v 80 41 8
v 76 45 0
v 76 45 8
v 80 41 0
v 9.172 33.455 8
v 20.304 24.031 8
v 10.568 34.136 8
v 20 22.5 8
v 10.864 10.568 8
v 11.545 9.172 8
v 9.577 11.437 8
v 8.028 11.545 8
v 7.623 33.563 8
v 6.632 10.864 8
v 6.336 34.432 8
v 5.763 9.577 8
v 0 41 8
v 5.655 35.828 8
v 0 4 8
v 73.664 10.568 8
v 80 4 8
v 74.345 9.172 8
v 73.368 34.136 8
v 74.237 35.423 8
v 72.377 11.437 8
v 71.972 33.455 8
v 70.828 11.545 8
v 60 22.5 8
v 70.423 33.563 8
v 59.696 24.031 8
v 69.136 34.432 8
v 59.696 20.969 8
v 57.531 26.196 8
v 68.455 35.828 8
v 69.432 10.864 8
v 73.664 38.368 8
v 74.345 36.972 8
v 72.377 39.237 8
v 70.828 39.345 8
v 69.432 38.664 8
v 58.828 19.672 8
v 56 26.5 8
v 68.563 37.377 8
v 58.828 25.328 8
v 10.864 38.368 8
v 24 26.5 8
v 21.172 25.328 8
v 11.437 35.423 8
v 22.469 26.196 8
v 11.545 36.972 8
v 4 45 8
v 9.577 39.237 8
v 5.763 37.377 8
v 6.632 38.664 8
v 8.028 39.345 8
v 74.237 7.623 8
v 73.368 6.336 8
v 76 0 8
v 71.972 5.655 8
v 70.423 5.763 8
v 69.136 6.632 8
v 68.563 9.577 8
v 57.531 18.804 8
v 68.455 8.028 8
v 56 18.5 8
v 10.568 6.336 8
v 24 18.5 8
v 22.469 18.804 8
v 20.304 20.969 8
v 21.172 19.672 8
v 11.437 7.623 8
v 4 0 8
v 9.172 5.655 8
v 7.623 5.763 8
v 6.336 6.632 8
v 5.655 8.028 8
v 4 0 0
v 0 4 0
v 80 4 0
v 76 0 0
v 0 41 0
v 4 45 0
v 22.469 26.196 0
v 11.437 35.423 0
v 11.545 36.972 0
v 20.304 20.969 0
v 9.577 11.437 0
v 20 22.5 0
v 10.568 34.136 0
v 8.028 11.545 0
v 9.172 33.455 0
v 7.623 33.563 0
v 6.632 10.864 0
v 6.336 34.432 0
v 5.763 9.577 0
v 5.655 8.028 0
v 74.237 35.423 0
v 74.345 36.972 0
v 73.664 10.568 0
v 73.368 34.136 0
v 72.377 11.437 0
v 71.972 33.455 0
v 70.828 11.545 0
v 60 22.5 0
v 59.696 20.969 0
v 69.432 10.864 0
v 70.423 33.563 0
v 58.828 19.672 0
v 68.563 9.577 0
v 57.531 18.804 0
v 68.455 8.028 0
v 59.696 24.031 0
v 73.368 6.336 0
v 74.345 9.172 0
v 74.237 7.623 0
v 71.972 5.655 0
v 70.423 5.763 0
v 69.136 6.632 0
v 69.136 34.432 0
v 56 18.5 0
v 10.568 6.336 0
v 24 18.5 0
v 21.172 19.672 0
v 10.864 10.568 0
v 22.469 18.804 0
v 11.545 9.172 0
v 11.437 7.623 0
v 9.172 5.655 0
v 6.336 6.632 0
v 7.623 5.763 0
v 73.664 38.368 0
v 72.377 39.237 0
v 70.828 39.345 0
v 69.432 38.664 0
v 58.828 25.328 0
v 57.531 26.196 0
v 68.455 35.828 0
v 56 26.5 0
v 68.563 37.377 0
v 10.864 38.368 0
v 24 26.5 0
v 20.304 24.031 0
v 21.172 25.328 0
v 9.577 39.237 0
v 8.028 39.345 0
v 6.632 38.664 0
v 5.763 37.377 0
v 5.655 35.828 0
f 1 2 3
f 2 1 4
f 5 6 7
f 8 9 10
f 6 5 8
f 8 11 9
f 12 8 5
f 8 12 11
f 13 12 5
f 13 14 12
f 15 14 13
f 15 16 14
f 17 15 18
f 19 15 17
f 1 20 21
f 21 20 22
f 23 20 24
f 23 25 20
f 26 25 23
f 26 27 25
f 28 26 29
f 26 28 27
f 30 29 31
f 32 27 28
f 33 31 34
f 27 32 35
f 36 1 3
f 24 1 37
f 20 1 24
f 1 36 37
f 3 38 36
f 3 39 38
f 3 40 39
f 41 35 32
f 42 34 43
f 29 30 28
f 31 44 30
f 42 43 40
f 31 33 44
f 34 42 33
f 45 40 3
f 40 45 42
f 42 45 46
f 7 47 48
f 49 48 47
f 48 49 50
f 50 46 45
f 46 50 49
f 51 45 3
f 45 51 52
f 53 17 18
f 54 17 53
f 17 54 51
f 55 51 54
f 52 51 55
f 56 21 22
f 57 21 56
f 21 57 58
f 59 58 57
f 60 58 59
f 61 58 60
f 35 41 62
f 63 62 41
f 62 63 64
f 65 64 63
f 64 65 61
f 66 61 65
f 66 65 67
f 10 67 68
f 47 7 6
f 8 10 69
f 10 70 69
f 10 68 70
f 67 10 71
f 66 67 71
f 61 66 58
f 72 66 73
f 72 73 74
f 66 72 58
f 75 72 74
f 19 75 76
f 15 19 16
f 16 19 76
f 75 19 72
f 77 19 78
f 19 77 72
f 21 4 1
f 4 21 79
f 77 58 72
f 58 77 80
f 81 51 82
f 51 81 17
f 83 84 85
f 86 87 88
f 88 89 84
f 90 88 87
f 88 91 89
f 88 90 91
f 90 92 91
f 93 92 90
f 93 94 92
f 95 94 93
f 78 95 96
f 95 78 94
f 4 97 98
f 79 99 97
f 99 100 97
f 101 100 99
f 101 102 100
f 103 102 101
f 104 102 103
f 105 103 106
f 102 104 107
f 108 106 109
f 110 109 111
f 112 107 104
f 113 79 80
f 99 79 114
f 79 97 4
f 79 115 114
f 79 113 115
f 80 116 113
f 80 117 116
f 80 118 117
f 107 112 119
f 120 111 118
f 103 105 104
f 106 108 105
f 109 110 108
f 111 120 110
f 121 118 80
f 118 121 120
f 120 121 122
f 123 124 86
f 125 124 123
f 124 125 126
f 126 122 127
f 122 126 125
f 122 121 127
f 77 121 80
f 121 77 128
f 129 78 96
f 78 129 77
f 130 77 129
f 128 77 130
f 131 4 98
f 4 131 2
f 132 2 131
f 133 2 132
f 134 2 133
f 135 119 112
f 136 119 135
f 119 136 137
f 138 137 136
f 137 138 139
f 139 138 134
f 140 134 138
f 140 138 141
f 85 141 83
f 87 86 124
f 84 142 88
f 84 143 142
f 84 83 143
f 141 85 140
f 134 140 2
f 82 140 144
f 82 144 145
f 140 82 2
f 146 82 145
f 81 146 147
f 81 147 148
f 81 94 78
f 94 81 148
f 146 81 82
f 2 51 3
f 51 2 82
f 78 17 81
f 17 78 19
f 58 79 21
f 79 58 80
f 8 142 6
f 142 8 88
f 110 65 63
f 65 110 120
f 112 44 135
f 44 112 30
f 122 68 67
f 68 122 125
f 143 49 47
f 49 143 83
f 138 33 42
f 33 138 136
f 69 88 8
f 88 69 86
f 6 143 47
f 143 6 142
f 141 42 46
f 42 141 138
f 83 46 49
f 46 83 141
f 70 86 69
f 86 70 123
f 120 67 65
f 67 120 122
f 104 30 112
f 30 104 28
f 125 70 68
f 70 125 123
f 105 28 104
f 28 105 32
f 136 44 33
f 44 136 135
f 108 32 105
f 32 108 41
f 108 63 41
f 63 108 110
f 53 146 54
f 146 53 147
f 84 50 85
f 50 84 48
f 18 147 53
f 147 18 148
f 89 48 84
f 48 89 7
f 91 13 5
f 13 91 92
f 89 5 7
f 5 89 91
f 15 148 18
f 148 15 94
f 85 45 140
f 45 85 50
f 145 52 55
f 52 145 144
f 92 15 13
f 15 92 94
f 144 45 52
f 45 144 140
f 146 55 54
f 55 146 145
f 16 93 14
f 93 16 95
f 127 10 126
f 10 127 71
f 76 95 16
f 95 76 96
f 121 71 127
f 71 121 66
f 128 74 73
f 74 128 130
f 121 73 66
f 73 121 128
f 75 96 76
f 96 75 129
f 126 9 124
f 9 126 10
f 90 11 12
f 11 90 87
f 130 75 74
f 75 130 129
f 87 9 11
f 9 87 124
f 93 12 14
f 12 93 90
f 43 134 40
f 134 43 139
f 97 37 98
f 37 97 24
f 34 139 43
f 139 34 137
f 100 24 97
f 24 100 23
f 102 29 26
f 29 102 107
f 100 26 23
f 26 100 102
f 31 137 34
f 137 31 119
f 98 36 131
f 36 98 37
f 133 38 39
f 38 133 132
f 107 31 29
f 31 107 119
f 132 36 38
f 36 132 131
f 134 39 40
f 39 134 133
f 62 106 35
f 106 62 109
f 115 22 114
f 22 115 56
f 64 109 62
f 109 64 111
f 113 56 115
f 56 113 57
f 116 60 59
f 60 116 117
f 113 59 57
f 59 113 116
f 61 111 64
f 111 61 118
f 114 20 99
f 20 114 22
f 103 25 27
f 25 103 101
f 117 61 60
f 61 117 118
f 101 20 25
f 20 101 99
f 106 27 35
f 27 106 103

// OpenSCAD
$fn = 32;

// ----------------------------------------------------------------------
// Bracket plate: slot plate 80 x 45
// ----------------------------------------------------------------------

// --- parameters (mm) ---
hole_r = 3;               // bolt hole radius
plate_t = 8;              // plate thickness, Z (extrusion height)
plate_l = 80;             // plate length
plate_w = 45;             // plate width
slot_l = 32;              // slot straight length
slot_r = 4;               // slot end radius

slot_len = slot_l + 2 * slot_r;
slot_w = 2 * slot_r;
hole_d2 = 2 * hole_r;

profile = [[4, 0], [76, 0], [80, 4], [80, 41], [76, 45], [4, 45], [0, 41], [0, 4]];  // primary outline, 8 points, counter clockwise
void_1 = [[56, 18.5], [57.531, 18.804], [58.828, 19.672], [59.696, 20.969], [60, 22.5], [59.696, 24.031], [58.828, 25.328], [57.531, 26.196], [56, 26.5], [24, 26.5], [22.469, 26.196], [21.172, 25.328], [20.304, 24.031], [20, 22.5], [20.304, 20.969], [21.172, 19.672], [22.469, 18.804], [24, 18.5]];  // grip slot, 18 points
void_2 = [[11.545, 36.972], [10.864, 38.368], [9.577, 39.237], [8.028, 39.345], [6.632, 38.664], [5.763, 37.377], [5.655, 35.828], [6.336, 34.432], [7.623, 33.563], [9.172, 33.455], [10.568, 34.136], [11.437, 35.423]];  // corner hole, 12 points
void_3 = [[11.545, 9.172], [10.864, 10.568], [9.577, 11.437], [8.028, 11.545], [6.632, 10.864], [5.763, 9.577], [5.655, 8.028], [6.336, 6.632], [7.623, 5.763], [9.172, 5.655], [10.568, 6.336], [11.437, 7.623]];  // corner hole, 12 points
void_4 = [[74.345, 36.972], [73.664, 38.368], [72.377, 39.237], [70.828, 39.345], [69.432, 38.664], [68.563, 37.377], [68.455, 35.828], [69.136, 34.432], [70.423, 33.563], [71.972, 33.455], [73.368, 34.136], [74.237, 35.423]];  // corner hole, 12 points
void_5 = [[74.345, 9.172], [73.664, 10.568], [72.377, 11.437], [70.828, 11.545], [69.432, 10.864], [68.563, 9.577], [68.455, 8.028], [69.136, 6.632], [70.423, 5.763], [71.972, 5.655], [73.368, 6.336], [74.237, 7.623]];  // corner hole, 12 points

// --- the one profile operation ---
difference() {
  linear_extrude(height = plate_t) polygon(points = profile);
  translate([0, 0, -1])
    linear_extrude(height = plate_t + 2) polygon(points = void_1);
  translate([0, 0, -1])
    linear_extrude(height = plate_t + 2) polygon(points = void_2);
  translate([0, 0, -1])
    linear_extrude(height = plate_t + 2) polygon(points = void_3);
  translate([0, 0, -1])
    linear_extrude(height = plate_t + 2) polygon(points = void_4);
  translate([0, 0, -1])
    linear_extrude(height = plate_t + 2) polygon(points = void_5);
}
